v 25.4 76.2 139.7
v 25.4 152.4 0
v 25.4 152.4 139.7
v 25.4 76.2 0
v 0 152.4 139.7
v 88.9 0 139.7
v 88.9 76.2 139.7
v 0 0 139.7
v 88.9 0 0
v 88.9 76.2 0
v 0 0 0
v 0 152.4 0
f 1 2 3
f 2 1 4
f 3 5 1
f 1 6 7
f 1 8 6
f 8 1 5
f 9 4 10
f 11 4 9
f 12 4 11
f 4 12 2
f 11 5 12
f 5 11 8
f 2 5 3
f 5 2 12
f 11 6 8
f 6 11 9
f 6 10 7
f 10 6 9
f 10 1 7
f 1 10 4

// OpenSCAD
//.4 layer
//.6 nozzle
//10% infill
//eSun PLA+
//10 top&bottom layers
//solid infill every 100 layers
//10mm/s first layer speed
//fresh clean bed with soap
w1=1*25.4;
w2=3.5*25.4;
h=11/2*25.4;
d1=6*25.4;
d2=3*25.4;

cube([w1,d1,h]);
cube([w2,d2,h]);
